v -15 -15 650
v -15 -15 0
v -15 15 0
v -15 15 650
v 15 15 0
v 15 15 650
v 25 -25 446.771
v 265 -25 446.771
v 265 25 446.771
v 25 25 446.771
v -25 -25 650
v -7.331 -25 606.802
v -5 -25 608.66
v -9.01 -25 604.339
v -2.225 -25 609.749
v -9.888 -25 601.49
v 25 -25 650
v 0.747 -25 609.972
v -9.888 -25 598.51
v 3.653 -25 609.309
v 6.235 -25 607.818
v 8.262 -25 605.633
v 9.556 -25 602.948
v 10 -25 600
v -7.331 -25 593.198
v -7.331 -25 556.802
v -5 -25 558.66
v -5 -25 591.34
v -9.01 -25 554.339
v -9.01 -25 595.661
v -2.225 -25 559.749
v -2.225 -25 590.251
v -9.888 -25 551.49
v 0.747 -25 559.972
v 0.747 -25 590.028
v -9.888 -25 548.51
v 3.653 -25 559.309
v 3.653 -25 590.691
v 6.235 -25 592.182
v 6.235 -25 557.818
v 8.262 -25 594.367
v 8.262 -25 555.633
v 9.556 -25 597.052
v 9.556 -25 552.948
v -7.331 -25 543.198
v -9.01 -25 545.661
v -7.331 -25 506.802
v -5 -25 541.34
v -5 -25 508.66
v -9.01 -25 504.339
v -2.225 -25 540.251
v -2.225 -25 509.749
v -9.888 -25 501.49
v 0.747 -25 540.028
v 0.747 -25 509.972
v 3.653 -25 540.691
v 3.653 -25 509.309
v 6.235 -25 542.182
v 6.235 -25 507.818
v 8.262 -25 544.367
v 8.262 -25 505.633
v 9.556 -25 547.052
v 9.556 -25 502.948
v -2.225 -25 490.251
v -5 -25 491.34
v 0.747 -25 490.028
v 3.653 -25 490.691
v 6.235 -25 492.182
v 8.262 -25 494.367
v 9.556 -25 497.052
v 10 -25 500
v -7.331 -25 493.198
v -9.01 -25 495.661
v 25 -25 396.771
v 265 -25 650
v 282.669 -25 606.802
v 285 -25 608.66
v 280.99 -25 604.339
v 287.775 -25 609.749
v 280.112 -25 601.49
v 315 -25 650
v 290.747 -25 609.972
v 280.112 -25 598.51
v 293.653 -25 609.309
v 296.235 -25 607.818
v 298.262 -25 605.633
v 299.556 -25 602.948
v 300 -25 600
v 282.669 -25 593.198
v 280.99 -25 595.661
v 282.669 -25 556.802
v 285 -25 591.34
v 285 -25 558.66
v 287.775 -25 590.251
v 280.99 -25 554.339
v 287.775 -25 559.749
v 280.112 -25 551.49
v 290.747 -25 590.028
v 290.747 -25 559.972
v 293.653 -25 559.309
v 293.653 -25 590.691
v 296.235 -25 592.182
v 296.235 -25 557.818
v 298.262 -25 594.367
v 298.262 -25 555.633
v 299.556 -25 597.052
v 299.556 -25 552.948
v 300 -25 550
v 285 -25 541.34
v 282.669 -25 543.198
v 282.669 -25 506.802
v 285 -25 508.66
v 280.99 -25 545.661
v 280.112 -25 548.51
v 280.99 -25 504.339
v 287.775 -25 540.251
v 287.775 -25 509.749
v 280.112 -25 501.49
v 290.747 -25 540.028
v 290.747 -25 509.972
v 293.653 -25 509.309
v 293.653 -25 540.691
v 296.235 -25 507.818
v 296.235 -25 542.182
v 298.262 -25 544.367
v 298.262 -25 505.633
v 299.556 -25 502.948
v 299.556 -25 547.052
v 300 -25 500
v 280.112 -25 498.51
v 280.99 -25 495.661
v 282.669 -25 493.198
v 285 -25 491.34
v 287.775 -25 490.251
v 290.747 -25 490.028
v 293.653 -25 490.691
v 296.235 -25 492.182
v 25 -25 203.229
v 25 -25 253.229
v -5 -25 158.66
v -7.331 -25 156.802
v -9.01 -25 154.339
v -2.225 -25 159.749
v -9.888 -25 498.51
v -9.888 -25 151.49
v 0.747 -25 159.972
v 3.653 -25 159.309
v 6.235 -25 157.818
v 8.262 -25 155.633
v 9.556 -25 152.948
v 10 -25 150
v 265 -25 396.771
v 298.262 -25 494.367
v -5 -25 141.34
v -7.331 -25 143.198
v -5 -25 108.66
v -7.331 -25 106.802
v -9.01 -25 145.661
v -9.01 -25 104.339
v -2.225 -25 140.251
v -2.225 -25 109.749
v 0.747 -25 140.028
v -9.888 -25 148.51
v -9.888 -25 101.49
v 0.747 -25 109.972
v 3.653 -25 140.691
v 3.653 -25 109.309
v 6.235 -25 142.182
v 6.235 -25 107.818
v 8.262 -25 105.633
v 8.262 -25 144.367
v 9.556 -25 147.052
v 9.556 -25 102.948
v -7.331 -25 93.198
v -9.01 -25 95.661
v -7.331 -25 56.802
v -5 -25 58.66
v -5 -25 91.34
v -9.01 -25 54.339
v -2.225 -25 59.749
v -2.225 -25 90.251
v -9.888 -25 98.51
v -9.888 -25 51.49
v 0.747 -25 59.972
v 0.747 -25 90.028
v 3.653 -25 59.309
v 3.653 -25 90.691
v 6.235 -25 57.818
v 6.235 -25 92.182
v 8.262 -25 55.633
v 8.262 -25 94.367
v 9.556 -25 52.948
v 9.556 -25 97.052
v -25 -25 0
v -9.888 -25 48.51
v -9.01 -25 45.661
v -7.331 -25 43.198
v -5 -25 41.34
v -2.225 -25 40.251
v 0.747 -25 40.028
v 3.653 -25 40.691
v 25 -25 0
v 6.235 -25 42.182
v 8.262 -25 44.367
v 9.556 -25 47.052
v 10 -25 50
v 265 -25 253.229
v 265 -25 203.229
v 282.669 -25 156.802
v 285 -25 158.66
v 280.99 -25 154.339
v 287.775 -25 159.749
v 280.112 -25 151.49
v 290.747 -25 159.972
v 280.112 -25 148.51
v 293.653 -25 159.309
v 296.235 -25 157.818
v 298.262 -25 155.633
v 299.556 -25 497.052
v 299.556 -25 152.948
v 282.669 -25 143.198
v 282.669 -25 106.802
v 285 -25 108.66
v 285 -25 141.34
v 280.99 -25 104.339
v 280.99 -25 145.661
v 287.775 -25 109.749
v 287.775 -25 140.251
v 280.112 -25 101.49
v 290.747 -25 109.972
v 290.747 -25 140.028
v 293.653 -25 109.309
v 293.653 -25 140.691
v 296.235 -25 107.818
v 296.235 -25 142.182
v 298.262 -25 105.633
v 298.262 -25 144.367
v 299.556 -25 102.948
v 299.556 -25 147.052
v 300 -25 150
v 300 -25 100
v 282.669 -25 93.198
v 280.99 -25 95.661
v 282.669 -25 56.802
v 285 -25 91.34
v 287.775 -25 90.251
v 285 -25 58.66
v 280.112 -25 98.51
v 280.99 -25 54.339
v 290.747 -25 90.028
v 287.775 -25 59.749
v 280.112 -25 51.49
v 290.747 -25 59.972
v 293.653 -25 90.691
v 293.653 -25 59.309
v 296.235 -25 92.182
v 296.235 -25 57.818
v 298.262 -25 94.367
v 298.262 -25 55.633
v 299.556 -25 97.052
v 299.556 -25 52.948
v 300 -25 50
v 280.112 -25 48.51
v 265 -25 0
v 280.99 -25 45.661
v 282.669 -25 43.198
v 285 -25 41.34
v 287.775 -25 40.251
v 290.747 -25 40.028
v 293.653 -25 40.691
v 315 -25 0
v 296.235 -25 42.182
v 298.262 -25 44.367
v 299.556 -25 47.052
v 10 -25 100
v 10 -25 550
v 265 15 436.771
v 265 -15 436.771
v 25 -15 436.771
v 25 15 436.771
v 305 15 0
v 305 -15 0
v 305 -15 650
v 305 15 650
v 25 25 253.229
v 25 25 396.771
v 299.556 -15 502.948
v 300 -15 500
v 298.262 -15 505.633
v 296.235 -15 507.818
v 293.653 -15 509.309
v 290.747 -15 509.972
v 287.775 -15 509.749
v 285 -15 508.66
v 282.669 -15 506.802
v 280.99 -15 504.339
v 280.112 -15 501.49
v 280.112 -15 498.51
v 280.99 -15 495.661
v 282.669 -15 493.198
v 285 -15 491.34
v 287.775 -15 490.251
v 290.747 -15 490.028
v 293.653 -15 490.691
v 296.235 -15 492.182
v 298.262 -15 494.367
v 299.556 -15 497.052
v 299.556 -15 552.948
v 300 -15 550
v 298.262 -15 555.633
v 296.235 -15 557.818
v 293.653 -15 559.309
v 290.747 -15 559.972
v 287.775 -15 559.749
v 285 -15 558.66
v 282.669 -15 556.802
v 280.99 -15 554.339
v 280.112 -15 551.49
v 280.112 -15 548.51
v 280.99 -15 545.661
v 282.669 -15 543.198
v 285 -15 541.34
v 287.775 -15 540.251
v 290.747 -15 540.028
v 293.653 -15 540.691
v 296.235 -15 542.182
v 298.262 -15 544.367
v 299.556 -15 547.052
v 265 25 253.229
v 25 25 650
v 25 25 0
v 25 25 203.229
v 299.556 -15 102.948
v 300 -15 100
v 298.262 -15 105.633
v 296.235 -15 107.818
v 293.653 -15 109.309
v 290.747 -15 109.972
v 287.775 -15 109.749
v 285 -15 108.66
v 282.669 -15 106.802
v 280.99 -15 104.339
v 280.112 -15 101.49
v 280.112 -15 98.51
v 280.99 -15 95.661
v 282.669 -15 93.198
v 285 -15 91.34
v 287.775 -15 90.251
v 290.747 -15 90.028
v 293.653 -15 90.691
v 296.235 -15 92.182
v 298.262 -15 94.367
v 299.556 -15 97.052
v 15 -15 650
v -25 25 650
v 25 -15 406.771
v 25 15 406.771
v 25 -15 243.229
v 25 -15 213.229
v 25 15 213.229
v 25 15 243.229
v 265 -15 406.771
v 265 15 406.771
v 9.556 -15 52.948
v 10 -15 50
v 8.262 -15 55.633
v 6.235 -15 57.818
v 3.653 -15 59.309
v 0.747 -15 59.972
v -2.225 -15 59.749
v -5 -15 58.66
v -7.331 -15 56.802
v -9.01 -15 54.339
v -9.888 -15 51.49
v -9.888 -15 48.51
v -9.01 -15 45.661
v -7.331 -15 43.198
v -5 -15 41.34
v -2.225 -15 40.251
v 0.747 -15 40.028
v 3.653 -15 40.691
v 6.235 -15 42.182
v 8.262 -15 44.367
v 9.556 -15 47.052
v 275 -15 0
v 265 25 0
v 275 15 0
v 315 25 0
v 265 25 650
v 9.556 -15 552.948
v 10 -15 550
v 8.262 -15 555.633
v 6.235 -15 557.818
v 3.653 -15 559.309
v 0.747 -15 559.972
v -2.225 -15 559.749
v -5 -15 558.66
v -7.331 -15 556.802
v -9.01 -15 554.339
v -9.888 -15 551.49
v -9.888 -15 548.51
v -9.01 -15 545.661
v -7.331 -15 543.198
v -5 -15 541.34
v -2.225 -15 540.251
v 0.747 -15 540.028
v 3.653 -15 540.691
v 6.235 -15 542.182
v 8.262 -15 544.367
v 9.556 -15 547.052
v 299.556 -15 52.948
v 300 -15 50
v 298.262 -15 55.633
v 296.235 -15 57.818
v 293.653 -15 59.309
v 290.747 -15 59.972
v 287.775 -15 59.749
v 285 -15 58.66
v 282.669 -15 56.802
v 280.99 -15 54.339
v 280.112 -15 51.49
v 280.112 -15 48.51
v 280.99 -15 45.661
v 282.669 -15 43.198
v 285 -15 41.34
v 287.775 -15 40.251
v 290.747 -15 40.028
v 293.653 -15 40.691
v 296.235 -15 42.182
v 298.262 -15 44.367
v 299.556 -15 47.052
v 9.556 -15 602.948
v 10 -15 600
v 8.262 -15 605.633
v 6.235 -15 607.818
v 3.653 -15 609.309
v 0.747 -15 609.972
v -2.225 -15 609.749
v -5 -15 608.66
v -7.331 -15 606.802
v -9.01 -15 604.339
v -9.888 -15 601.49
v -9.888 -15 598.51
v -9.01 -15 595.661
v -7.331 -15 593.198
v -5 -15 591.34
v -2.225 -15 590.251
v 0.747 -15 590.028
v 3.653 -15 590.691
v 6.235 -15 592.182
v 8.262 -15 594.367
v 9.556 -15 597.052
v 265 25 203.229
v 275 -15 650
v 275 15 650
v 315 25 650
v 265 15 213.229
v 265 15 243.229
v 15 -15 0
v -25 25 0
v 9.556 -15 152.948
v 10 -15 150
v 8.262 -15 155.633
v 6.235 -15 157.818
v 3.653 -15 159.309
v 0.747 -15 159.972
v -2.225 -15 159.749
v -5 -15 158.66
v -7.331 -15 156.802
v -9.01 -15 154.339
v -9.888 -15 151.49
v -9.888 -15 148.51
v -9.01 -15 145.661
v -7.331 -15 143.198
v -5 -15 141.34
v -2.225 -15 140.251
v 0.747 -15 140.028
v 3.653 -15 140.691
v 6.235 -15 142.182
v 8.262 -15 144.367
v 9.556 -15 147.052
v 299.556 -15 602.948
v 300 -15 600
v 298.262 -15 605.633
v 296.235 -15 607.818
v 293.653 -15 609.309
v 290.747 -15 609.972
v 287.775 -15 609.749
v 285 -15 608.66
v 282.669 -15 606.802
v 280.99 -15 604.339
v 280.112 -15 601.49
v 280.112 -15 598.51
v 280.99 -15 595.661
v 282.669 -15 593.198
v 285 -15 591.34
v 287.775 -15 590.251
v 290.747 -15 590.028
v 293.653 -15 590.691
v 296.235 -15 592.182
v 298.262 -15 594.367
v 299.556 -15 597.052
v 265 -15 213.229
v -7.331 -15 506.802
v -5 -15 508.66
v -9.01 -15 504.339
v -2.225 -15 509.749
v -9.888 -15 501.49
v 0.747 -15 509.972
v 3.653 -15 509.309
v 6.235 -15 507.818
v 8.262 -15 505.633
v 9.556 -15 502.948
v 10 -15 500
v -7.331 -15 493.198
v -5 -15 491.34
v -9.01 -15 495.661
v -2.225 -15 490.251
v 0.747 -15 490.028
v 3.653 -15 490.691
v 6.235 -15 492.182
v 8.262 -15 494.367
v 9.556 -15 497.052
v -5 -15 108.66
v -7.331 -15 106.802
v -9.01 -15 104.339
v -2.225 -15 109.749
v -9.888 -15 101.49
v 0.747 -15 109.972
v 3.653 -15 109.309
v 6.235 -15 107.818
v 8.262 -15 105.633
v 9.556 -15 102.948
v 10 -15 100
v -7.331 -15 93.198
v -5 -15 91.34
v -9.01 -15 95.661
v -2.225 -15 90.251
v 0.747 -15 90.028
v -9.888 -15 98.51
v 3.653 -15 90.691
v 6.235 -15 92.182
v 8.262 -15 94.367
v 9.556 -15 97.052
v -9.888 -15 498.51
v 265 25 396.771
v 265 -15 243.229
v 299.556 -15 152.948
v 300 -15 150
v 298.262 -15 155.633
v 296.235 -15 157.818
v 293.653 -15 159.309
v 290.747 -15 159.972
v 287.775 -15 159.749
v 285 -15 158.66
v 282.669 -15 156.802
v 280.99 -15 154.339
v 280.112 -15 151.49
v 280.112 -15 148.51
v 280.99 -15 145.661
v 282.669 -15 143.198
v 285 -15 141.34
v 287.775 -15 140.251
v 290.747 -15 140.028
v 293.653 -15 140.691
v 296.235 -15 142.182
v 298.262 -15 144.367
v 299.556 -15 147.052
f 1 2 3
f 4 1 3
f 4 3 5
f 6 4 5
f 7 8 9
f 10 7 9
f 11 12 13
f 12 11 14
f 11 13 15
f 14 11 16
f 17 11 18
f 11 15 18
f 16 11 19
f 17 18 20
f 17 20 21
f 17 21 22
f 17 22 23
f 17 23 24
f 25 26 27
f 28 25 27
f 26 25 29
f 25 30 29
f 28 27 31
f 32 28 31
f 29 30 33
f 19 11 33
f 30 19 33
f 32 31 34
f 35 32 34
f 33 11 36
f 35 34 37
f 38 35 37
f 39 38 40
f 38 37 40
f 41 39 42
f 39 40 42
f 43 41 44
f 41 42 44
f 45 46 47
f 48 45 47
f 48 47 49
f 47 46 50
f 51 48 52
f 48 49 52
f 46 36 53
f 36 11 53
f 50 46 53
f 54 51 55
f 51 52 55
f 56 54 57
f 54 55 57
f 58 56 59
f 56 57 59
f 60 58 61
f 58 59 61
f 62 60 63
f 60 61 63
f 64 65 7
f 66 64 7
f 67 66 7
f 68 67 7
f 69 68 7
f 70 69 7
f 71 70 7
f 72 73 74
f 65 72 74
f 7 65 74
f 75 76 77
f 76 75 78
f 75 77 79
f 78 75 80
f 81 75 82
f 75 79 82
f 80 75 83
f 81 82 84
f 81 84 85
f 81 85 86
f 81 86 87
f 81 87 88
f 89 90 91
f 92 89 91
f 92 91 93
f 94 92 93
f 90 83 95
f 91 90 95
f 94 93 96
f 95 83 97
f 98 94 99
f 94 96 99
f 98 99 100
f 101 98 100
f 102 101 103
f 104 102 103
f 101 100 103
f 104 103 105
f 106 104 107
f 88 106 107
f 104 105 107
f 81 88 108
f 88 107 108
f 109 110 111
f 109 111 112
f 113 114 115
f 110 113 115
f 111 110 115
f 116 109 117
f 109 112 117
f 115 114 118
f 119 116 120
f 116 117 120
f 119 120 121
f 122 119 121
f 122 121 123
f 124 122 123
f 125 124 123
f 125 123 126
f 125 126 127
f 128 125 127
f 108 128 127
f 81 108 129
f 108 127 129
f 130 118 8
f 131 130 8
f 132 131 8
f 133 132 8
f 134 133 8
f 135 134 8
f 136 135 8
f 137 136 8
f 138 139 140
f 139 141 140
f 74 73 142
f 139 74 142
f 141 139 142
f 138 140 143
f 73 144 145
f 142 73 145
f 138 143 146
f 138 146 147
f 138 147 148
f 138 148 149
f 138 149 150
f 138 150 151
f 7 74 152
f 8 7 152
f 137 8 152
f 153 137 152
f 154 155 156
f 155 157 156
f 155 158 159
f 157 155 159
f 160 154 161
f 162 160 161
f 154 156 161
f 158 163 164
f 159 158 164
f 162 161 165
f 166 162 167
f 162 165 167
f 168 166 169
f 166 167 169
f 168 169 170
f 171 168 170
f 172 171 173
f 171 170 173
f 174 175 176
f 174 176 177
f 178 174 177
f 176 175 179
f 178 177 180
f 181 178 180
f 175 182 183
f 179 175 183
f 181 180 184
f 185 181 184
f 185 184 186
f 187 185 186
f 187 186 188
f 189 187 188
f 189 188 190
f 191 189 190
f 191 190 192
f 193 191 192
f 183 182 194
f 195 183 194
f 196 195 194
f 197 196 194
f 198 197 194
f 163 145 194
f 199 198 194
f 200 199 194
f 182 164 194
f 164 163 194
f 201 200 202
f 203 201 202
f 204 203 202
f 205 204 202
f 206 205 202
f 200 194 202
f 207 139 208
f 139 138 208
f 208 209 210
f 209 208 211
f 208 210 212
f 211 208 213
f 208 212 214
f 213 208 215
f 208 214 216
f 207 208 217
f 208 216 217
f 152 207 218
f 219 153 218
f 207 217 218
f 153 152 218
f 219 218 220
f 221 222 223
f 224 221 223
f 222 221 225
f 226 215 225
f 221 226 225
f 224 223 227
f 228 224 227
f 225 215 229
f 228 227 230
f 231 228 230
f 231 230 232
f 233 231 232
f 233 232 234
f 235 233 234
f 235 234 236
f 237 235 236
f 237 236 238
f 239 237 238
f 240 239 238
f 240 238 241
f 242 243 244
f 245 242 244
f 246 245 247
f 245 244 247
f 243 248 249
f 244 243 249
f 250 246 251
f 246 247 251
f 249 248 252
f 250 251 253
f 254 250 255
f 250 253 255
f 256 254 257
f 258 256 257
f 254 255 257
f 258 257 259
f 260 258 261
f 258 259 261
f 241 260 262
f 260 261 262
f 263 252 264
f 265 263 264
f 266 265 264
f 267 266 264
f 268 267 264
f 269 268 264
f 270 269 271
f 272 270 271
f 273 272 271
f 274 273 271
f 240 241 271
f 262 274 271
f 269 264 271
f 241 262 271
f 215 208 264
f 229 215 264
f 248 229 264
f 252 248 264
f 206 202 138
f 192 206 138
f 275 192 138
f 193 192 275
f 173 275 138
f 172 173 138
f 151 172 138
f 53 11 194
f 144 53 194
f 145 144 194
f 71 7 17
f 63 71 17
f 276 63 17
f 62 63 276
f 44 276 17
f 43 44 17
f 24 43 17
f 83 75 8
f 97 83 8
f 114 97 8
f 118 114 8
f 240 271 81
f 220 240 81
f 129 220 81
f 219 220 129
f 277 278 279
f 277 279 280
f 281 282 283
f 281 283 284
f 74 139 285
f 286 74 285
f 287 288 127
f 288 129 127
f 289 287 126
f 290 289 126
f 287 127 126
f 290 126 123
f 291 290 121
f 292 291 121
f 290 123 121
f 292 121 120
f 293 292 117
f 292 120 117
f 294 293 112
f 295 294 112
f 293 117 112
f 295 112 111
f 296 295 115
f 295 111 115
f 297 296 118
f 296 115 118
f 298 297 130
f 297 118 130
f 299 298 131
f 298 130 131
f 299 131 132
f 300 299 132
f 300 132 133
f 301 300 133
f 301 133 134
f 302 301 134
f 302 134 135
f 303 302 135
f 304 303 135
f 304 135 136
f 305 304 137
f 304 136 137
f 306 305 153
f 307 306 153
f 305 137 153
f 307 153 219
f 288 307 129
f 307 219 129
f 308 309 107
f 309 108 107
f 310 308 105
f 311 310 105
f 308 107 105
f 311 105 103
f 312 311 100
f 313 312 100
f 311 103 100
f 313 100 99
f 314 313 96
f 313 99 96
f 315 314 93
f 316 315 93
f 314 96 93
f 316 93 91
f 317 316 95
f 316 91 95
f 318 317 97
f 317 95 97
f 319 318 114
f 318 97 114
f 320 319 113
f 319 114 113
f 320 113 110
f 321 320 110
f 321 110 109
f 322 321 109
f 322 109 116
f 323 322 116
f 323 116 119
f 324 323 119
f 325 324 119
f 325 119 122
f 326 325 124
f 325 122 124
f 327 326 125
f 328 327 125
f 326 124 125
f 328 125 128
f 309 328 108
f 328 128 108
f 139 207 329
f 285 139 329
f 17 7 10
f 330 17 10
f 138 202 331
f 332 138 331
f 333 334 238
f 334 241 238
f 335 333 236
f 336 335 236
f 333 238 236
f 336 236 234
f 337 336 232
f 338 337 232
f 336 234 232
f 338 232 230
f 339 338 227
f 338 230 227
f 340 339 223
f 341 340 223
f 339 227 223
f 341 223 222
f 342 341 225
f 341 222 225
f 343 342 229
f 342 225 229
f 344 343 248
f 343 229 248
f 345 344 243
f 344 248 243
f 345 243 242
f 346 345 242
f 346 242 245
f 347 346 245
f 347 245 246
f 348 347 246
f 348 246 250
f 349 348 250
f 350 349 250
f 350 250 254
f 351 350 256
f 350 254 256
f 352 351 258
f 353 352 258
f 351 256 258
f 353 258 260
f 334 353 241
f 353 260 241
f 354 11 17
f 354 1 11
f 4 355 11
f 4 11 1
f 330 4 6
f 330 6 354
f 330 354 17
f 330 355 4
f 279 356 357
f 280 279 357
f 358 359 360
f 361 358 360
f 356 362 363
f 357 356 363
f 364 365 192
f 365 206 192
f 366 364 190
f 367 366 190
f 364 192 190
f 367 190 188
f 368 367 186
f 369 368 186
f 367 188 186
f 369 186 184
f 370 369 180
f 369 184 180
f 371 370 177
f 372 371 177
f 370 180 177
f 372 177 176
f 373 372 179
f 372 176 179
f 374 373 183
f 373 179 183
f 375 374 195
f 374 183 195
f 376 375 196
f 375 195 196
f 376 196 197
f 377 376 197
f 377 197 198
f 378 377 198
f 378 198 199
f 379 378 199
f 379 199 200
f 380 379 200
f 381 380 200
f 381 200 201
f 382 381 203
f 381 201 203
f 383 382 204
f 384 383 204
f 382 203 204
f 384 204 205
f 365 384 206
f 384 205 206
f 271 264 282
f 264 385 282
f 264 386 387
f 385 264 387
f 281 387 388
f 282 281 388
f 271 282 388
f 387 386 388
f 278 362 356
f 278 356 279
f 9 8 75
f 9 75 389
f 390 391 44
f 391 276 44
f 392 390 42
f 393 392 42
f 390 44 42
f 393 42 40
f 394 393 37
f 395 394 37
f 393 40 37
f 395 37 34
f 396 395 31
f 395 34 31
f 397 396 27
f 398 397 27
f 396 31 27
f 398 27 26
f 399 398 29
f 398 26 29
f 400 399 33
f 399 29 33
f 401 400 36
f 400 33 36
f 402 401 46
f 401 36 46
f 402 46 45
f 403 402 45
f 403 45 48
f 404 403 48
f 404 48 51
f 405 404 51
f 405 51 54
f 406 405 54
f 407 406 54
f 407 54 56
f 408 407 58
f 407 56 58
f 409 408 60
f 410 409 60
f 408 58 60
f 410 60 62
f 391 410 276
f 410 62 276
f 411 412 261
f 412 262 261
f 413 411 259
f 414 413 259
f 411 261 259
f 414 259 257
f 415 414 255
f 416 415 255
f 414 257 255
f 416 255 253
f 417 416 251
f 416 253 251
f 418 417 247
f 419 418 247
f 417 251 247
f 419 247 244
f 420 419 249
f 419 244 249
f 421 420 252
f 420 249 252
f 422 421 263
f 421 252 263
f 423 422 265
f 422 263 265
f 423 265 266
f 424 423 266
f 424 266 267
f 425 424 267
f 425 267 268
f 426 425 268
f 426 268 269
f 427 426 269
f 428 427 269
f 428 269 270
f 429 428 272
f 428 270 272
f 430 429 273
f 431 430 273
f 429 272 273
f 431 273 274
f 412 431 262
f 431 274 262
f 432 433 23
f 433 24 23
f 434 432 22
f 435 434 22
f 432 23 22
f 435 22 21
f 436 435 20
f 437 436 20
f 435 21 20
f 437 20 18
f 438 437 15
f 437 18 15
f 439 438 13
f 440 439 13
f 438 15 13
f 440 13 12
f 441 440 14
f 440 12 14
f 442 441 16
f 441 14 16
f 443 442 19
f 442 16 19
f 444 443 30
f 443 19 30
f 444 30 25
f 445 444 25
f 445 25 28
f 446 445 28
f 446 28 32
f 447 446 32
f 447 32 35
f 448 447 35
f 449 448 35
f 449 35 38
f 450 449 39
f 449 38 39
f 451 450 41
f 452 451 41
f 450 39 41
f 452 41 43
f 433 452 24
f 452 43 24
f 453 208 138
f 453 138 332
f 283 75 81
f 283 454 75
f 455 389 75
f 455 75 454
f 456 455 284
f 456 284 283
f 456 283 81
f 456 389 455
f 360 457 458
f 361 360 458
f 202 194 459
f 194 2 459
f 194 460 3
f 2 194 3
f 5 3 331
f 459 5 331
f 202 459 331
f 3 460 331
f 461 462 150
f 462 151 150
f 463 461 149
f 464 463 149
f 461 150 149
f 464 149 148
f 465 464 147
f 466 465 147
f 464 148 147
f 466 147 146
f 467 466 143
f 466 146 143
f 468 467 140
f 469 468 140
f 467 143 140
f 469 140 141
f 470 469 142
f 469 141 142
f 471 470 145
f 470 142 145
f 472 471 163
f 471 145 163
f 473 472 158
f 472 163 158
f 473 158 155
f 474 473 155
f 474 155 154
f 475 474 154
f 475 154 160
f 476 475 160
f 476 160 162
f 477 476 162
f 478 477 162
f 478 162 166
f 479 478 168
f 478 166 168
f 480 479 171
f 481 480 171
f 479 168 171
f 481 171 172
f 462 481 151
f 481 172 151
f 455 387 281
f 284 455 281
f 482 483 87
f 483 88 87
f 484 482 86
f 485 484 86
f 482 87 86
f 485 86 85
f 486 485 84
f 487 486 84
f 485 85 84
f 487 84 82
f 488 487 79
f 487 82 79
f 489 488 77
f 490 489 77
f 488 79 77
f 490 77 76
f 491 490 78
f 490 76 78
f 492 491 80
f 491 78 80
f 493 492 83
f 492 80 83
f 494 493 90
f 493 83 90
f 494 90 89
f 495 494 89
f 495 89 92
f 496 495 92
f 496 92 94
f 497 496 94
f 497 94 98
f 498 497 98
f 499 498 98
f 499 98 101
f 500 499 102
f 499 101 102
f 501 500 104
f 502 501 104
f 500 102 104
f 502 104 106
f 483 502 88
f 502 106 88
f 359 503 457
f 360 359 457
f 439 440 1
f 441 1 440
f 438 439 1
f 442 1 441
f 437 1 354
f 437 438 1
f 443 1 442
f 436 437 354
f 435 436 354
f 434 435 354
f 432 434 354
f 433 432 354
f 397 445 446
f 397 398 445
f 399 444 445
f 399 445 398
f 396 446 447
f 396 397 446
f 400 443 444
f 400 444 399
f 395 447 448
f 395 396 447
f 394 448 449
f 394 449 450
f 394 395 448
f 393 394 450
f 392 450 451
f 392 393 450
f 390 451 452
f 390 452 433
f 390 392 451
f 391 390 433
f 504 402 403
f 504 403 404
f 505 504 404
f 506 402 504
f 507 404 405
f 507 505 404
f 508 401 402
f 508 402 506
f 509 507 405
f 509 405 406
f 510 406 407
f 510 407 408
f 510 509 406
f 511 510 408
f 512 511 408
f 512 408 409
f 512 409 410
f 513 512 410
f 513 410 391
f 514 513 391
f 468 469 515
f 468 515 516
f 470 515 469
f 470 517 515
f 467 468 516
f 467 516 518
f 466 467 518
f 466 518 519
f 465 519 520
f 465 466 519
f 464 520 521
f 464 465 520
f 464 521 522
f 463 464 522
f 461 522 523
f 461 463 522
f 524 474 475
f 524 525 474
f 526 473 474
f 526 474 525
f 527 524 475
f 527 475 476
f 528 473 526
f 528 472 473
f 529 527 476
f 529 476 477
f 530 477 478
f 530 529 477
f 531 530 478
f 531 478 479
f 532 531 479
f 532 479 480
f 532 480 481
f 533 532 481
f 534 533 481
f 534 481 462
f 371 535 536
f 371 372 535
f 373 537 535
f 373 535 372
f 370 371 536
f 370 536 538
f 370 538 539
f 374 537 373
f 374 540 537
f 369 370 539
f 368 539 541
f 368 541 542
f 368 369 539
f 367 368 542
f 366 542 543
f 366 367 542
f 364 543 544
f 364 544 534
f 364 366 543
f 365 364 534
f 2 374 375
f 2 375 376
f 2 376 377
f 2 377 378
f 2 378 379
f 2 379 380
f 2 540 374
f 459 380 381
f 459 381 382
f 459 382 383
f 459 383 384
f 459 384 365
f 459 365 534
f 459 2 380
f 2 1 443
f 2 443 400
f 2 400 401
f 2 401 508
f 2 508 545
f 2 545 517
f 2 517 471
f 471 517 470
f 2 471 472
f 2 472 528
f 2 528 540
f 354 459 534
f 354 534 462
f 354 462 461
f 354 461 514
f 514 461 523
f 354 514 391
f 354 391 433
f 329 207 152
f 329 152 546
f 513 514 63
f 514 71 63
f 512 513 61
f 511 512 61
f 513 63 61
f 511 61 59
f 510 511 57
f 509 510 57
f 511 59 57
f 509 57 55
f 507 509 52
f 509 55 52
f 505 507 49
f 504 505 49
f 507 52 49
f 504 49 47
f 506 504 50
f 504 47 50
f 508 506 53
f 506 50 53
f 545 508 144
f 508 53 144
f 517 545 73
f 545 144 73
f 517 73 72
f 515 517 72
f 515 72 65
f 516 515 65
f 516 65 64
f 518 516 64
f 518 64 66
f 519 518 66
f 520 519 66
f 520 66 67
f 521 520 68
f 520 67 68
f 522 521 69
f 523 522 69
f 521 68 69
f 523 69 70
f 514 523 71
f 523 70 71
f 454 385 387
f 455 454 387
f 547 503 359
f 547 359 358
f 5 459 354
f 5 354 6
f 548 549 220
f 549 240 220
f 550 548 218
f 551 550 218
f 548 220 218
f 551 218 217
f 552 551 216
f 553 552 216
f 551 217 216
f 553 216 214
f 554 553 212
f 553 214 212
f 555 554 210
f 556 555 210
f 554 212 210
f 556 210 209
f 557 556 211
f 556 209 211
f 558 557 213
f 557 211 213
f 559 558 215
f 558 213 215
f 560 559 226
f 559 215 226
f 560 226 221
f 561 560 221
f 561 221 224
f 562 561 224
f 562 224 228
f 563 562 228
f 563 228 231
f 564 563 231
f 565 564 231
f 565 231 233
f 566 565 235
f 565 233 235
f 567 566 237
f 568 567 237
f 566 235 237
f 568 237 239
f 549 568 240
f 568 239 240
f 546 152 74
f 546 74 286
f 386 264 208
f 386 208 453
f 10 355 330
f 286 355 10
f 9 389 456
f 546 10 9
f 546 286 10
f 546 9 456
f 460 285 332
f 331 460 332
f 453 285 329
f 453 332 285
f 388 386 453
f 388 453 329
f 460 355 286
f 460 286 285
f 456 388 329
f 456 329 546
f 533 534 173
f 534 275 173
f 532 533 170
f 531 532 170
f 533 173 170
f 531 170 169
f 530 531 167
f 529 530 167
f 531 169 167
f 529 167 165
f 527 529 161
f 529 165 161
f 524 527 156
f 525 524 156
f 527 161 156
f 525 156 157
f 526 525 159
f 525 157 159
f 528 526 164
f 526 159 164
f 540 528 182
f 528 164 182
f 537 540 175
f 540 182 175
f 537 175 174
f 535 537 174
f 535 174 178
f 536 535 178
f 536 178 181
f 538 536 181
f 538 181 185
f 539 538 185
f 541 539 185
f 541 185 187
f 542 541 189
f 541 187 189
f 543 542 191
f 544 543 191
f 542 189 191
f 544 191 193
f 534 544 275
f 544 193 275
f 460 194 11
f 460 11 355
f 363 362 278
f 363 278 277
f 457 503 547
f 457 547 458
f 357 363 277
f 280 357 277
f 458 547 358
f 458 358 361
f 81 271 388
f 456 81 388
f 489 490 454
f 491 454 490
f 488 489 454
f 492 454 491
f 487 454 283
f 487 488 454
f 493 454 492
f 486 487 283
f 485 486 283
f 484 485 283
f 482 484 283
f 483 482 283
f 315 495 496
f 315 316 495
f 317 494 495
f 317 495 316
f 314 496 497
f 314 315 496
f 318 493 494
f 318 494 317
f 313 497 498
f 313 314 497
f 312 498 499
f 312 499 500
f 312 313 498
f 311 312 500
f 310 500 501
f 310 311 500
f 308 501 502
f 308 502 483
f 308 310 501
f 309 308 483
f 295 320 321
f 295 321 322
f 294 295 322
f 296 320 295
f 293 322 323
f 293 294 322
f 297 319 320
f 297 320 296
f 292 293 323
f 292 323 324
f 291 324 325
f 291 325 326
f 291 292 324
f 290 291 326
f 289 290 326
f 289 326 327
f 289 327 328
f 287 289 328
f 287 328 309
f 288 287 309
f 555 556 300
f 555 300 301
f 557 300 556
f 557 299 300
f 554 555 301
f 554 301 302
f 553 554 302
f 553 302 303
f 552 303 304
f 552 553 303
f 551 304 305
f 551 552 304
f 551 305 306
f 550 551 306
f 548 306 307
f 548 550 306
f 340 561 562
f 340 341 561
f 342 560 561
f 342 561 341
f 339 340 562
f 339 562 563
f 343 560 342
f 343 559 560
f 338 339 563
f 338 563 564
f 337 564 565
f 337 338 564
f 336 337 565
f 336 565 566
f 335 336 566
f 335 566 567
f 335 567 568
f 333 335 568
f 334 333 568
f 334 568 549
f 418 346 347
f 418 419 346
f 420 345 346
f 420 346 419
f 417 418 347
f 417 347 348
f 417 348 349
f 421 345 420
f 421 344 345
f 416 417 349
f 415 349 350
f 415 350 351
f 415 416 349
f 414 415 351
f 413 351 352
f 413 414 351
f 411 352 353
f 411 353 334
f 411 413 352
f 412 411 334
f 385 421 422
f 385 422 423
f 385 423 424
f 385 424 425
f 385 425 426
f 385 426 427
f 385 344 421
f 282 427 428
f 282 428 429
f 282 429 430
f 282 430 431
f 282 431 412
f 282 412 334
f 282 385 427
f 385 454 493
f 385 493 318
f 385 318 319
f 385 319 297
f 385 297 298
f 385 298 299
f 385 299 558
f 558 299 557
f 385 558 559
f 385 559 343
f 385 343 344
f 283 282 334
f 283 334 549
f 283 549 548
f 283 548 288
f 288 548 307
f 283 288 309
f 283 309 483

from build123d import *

# Parameters (mm, degrees)
SKETCH1_W               = 50
SKETCH1_H               = 50
SKETCH1_W_2             = 30
SKETCH1_H_2             = 30
BOSS_EXTRUDE1_DEPTH     = 650
BOSS_EXTRUDE1_2_DEPTH   = 650
SKETCH2_R               = 10
CUT_EXTRUDE1_DEPTH      = 18
CUT_EXTRUDE1_DEPTH_BACK = 13
SKETCH3_W               = 50
SKETCH3_H               = 50
SKETCH3_W_2             = 30
SKETCH3_H_2             = 30
BOSS_EXTRUDE3_DEPTH     = 240


with BuildPart() as part:
    # Sketch1 → Boss-Extrude1 (new body)
    with BuildSketch(Plane.XY):
        Rectangle(SKETCH1_W, SKETCH1_H)
        Rectangle(SKETCH1_W_2, SKETCH1_H_2, mode=Mode.SUBTRACT)
    extrude(amount=BOSS_EXTRUDE1_DEPTH)


with BuildPart() as body_2:
    # Sketch1 → Boss-Extrude1 2 (new body)
    with BuildSketch(Plane.XY):
        with Locations((290, 0)):
            Rectangle(SKETCH1_W, SKETCH1_H)
        with Locations((290, 0)):
            Rectangle(SKETCH1_W_2, SKETCH1_H_2, mode=Mode.SUBTRACT)
    extrude(amount=BOSS_EXTRUDE1_2_DEPTH)


with BuildPart() as cut_extrude1_tool:
    # Sketch2 → Cut-Extrude1 (new body, two sides)
    with BuildSketch(Plane.XZ.offset(25)) as cut_extrude1_sk:
        with Locations((290, 600)):
            Circle(SKETCH2_R)
        with Locations((290, 550)):
            Circle(SKETCH2_R)
        with Locations((290, 500)):
            Circle(SKETCH2_R)
        with Locations((290, 150)):
            Circle(SKETCH2_R)
        with Locations((290, 100)):
            Circle(SKETCH2_R)
        with Locations((290, 50)):
            Circle(SKETCH2_R)
        with Locations((0, 500)):
            Circle(SKETCH2_R)
        with Locations((0, 550)):
            Circle(SKETCH2_R)
        with Locations((0, 600)):
            Circle(SKETCH2_R)
        with Locations((0, 50)):
            Circle(SKETCH2_R)
        with Locations((0, 100)):
            Circle(SKETCH2_R)
        with Locations((0, 150)):
            Circle(SKETCH2_R)
    extrude(amount=CUT_EXTRUDE1_DEPTH)
    extrude(cut_extrude1_sk.sketch, amount=-CUT_EXTRUDE1_DEPTH_BACK)


with BuildPart() as part_1:
    add(part.part)

    # Cut-Extrude1: cut by cut_extrude1_tool
    add(cut_extrude1_tool.part, mode=Mode.SUBTRACT)



with BuildPart() as body_2_1:
    add(body_2.part)

    # Cut-Extrude1: cut by cut_extrude1_tool
    add(cut_extrude1_tool.part, mode=Mode.SUBTRACT)


with BuildPart() as part_2:
    add(part_1.part)

    add(body_2_1.part)  # Boss-Extrude3 merges body 2
    # Sketch3 → Boss-Extrude3 (add)
    with BuildSketch(Plane.ZY.offset(-265)):
        with Locations((421.770995298, 0)):
            Rectangle(SKETCH3_W, SKETCH3_H)
        with Locations((421.770995298, 0)):
            Rectangle(SKETCH3_W_2, SKETCH3_H_2, mode=Mode.SUBTRACT)
        with Locations((228.229004702, 0)):
            Rectangle(SKETCH3_W, SKETCH3_H)
        with Locations((228.229004702, 0)):
            Rectangle(SKETCH3_W_2, SKETCH3_H_2, mode=Mode.SUBTRACT)
    extrude(amount=BOSS_EXTRUDE3_DEPTH)


solid = part_2.part
